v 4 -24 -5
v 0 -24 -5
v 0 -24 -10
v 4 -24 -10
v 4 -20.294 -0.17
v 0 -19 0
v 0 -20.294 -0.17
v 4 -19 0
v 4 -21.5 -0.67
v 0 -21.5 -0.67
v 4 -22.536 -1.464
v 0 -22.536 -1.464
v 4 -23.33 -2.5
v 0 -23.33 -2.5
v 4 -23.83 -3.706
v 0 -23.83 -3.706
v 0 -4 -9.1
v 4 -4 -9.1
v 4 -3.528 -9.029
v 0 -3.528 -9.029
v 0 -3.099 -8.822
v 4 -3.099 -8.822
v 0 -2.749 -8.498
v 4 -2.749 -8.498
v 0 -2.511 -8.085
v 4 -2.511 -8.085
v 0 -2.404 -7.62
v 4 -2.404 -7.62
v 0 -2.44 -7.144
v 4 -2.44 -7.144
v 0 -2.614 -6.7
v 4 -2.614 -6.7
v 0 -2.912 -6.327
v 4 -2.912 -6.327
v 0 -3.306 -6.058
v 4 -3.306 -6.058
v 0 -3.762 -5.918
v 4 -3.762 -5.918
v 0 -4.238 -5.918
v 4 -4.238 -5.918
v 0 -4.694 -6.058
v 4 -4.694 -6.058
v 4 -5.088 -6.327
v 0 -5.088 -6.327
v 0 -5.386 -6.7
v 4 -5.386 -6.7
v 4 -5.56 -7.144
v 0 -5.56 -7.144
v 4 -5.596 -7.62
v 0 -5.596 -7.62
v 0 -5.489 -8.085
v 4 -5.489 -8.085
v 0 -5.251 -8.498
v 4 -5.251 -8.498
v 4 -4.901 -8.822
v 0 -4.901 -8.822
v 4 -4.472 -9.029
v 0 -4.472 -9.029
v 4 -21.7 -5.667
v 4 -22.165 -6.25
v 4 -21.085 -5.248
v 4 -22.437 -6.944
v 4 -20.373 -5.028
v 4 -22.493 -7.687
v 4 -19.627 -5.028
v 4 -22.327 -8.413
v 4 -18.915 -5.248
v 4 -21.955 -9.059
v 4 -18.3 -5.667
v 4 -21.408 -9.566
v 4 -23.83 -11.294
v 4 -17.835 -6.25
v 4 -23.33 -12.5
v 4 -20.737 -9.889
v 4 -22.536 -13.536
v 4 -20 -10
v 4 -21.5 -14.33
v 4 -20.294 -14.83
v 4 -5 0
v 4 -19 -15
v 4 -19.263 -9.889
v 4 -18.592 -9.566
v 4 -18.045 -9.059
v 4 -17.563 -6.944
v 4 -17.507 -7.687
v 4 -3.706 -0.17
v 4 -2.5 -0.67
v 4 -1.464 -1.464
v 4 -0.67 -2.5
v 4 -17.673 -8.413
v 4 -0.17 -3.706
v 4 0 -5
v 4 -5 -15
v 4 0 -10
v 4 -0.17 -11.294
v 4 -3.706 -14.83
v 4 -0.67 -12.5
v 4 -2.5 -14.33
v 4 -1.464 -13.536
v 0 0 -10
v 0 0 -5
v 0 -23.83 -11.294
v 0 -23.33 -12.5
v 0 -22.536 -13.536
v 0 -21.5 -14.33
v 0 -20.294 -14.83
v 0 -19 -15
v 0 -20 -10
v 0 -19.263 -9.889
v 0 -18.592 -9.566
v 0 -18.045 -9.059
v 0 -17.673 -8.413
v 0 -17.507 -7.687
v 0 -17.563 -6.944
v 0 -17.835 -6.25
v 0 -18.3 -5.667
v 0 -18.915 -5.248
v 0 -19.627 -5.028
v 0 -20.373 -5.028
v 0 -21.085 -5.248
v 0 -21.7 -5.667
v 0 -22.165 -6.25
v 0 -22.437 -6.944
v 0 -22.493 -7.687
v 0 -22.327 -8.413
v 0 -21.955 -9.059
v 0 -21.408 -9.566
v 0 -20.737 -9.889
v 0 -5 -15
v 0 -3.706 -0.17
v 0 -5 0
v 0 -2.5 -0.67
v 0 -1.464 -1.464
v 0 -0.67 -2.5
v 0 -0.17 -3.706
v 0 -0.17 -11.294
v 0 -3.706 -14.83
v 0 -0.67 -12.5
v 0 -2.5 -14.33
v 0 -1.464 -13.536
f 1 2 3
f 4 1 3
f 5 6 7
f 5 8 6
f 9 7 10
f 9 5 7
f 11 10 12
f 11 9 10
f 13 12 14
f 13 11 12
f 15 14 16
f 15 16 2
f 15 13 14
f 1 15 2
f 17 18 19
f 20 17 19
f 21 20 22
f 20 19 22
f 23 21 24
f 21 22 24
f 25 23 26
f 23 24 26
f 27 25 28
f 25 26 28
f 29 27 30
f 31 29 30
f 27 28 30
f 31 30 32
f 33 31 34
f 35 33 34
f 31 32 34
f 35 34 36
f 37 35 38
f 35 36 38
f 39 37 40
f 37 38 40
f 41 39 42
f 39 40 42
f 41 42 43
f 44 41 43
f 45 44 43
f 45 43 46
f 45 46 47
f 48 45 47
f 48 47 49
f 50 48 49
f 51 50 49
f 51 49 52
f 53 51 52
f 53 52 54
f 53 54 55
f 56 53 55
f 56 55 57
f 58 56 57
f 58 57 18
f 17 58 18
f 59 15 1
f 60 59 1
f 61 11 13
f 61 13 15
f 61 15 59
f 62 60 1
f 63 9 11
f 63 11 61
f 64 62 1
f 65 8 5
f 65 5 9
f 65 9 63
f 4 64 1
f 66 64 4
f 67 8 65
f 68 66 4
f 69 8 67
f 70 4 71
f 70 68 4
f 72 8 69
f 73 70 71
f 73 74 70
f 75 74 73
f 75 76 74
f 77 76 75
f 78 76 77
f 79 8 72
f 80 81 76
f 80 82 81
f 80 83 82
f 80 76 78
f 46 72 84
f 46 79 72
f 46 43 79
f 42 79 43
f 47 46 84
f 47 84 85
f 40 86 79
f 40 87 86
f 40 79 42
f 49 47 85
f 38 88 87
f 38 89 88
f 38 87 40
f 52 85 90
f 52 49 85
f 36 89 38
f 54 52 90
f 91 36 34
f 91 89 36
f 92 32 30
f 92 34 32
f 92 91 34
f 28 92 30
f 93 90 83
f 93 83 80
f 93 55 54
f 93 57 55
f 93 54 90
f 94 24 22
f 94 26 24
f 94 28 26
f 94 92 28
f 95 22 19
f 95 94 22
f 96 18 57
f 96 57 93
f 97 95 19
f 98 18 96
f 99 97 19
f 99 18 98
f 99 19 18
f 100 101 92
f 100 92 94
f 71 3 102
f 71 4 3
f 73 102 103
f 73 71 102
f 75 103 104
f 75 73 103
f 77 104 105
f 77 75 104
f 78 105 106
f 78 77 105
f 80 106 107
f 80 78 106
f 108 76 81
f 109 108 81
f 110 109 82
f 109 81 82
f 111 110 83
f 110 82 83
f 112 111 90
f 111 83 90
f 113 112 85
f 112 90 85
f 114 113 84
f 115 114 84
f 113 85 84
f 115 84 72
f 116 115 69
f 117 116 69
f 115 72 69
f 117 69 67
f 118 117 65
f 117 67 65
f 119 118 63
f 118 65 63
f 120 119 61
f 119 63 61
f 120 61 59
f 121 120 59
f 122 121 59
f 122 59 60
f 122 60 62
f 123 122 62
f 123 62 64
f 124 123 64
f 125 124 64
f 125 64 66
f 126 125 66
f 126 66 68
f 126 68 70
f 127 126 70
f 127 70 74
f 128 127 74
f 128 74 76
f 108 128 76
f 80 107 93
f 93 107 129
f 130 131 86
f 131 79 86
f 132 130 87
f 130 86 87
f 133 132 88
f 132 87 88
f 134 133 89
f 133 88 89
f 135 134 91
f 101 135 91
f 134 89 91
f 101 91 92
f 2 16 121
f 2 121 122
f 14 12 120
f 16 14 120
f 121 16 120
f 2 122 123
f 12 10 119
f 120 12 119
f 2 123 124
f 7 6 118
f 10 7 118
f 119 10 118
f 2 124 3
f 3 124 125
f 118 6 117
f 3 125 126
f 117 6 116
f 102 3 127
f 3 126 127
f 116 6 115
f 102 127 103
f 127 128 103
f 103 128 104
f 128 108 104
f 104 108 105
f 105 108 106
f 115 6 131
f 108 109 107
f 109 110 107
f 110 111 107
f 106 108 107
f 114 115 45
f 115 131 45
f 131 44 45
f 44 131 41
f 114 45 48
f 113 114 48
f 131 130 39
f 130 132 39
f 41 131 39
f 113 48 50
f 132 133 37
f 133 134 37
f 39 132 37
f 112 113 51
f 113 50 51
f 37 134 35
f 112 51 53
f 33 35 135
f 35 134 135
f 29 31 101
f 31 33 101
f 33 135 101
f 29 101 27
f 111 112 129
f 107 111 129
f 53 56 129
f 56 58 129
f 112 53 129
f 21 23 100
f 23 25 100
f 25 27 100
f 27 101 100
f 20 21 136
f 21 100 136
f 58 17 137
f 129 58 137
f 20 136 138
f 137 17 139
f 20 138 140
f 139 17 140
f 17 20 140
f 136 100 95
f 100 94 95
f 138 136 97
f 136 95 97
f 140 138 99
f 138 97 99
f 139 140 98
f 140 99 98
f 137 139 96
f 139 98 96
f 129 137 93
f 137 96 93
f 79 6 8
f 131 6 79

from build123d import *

# Parameters (mm, degrees)
SKETCH1_W           = 15
SKETCH1_H           = 24
BOSS_EXTRUDE1_DEPTH = 4
SKETCH2_R           = 2.5
SKETCH2_R_2         = 1.6
CUT_EXTRUDE1_DEPTH  = 29.583211856
FILLET1_R           = 5


with BuildPart() as part:
    # Sketch1 → Boss-Extrude1 (new body)
    with BuildSketch(Plane(origin=(0, 0, 0), x_dir=(0, 0, -1), z_dir=(1, 0, 0))):
        with Locations((7.5, -12)):
            Rectangle(SKETCH1_W, SKETCH1_H)
    extrude(amount=BOSS_EXTRUDE1_DEPTH)

    # Sketch2 → Cut-Extrude1 (cut, through all)
    with BuildSketch(Plane(origin=(4, 0, 0), x_dir=(0, 0, -1), z_dir=(1, 0, 0))):
        with Locations((7.5, -20)):
            Circle(SKETCH2_R)
        with Locations((7.5, -4)):
            Circle(SKETCH2_R_2)
    extrude(amount=-CUT_EXTRUDE1_DEPTH, mode=Mode.SUBTRACT)

    # Fillet1
    fillet1_edges = [part.edges().sort_by_distance(p)[0] for p in [
        (2, 0, 0),
        (2, 0, -15),
        (2, -24, -15),
        (2, -24, 0),
    ]]
    fillet(fillet1_edges, radius=FILLET1_R)


solid = part.part
